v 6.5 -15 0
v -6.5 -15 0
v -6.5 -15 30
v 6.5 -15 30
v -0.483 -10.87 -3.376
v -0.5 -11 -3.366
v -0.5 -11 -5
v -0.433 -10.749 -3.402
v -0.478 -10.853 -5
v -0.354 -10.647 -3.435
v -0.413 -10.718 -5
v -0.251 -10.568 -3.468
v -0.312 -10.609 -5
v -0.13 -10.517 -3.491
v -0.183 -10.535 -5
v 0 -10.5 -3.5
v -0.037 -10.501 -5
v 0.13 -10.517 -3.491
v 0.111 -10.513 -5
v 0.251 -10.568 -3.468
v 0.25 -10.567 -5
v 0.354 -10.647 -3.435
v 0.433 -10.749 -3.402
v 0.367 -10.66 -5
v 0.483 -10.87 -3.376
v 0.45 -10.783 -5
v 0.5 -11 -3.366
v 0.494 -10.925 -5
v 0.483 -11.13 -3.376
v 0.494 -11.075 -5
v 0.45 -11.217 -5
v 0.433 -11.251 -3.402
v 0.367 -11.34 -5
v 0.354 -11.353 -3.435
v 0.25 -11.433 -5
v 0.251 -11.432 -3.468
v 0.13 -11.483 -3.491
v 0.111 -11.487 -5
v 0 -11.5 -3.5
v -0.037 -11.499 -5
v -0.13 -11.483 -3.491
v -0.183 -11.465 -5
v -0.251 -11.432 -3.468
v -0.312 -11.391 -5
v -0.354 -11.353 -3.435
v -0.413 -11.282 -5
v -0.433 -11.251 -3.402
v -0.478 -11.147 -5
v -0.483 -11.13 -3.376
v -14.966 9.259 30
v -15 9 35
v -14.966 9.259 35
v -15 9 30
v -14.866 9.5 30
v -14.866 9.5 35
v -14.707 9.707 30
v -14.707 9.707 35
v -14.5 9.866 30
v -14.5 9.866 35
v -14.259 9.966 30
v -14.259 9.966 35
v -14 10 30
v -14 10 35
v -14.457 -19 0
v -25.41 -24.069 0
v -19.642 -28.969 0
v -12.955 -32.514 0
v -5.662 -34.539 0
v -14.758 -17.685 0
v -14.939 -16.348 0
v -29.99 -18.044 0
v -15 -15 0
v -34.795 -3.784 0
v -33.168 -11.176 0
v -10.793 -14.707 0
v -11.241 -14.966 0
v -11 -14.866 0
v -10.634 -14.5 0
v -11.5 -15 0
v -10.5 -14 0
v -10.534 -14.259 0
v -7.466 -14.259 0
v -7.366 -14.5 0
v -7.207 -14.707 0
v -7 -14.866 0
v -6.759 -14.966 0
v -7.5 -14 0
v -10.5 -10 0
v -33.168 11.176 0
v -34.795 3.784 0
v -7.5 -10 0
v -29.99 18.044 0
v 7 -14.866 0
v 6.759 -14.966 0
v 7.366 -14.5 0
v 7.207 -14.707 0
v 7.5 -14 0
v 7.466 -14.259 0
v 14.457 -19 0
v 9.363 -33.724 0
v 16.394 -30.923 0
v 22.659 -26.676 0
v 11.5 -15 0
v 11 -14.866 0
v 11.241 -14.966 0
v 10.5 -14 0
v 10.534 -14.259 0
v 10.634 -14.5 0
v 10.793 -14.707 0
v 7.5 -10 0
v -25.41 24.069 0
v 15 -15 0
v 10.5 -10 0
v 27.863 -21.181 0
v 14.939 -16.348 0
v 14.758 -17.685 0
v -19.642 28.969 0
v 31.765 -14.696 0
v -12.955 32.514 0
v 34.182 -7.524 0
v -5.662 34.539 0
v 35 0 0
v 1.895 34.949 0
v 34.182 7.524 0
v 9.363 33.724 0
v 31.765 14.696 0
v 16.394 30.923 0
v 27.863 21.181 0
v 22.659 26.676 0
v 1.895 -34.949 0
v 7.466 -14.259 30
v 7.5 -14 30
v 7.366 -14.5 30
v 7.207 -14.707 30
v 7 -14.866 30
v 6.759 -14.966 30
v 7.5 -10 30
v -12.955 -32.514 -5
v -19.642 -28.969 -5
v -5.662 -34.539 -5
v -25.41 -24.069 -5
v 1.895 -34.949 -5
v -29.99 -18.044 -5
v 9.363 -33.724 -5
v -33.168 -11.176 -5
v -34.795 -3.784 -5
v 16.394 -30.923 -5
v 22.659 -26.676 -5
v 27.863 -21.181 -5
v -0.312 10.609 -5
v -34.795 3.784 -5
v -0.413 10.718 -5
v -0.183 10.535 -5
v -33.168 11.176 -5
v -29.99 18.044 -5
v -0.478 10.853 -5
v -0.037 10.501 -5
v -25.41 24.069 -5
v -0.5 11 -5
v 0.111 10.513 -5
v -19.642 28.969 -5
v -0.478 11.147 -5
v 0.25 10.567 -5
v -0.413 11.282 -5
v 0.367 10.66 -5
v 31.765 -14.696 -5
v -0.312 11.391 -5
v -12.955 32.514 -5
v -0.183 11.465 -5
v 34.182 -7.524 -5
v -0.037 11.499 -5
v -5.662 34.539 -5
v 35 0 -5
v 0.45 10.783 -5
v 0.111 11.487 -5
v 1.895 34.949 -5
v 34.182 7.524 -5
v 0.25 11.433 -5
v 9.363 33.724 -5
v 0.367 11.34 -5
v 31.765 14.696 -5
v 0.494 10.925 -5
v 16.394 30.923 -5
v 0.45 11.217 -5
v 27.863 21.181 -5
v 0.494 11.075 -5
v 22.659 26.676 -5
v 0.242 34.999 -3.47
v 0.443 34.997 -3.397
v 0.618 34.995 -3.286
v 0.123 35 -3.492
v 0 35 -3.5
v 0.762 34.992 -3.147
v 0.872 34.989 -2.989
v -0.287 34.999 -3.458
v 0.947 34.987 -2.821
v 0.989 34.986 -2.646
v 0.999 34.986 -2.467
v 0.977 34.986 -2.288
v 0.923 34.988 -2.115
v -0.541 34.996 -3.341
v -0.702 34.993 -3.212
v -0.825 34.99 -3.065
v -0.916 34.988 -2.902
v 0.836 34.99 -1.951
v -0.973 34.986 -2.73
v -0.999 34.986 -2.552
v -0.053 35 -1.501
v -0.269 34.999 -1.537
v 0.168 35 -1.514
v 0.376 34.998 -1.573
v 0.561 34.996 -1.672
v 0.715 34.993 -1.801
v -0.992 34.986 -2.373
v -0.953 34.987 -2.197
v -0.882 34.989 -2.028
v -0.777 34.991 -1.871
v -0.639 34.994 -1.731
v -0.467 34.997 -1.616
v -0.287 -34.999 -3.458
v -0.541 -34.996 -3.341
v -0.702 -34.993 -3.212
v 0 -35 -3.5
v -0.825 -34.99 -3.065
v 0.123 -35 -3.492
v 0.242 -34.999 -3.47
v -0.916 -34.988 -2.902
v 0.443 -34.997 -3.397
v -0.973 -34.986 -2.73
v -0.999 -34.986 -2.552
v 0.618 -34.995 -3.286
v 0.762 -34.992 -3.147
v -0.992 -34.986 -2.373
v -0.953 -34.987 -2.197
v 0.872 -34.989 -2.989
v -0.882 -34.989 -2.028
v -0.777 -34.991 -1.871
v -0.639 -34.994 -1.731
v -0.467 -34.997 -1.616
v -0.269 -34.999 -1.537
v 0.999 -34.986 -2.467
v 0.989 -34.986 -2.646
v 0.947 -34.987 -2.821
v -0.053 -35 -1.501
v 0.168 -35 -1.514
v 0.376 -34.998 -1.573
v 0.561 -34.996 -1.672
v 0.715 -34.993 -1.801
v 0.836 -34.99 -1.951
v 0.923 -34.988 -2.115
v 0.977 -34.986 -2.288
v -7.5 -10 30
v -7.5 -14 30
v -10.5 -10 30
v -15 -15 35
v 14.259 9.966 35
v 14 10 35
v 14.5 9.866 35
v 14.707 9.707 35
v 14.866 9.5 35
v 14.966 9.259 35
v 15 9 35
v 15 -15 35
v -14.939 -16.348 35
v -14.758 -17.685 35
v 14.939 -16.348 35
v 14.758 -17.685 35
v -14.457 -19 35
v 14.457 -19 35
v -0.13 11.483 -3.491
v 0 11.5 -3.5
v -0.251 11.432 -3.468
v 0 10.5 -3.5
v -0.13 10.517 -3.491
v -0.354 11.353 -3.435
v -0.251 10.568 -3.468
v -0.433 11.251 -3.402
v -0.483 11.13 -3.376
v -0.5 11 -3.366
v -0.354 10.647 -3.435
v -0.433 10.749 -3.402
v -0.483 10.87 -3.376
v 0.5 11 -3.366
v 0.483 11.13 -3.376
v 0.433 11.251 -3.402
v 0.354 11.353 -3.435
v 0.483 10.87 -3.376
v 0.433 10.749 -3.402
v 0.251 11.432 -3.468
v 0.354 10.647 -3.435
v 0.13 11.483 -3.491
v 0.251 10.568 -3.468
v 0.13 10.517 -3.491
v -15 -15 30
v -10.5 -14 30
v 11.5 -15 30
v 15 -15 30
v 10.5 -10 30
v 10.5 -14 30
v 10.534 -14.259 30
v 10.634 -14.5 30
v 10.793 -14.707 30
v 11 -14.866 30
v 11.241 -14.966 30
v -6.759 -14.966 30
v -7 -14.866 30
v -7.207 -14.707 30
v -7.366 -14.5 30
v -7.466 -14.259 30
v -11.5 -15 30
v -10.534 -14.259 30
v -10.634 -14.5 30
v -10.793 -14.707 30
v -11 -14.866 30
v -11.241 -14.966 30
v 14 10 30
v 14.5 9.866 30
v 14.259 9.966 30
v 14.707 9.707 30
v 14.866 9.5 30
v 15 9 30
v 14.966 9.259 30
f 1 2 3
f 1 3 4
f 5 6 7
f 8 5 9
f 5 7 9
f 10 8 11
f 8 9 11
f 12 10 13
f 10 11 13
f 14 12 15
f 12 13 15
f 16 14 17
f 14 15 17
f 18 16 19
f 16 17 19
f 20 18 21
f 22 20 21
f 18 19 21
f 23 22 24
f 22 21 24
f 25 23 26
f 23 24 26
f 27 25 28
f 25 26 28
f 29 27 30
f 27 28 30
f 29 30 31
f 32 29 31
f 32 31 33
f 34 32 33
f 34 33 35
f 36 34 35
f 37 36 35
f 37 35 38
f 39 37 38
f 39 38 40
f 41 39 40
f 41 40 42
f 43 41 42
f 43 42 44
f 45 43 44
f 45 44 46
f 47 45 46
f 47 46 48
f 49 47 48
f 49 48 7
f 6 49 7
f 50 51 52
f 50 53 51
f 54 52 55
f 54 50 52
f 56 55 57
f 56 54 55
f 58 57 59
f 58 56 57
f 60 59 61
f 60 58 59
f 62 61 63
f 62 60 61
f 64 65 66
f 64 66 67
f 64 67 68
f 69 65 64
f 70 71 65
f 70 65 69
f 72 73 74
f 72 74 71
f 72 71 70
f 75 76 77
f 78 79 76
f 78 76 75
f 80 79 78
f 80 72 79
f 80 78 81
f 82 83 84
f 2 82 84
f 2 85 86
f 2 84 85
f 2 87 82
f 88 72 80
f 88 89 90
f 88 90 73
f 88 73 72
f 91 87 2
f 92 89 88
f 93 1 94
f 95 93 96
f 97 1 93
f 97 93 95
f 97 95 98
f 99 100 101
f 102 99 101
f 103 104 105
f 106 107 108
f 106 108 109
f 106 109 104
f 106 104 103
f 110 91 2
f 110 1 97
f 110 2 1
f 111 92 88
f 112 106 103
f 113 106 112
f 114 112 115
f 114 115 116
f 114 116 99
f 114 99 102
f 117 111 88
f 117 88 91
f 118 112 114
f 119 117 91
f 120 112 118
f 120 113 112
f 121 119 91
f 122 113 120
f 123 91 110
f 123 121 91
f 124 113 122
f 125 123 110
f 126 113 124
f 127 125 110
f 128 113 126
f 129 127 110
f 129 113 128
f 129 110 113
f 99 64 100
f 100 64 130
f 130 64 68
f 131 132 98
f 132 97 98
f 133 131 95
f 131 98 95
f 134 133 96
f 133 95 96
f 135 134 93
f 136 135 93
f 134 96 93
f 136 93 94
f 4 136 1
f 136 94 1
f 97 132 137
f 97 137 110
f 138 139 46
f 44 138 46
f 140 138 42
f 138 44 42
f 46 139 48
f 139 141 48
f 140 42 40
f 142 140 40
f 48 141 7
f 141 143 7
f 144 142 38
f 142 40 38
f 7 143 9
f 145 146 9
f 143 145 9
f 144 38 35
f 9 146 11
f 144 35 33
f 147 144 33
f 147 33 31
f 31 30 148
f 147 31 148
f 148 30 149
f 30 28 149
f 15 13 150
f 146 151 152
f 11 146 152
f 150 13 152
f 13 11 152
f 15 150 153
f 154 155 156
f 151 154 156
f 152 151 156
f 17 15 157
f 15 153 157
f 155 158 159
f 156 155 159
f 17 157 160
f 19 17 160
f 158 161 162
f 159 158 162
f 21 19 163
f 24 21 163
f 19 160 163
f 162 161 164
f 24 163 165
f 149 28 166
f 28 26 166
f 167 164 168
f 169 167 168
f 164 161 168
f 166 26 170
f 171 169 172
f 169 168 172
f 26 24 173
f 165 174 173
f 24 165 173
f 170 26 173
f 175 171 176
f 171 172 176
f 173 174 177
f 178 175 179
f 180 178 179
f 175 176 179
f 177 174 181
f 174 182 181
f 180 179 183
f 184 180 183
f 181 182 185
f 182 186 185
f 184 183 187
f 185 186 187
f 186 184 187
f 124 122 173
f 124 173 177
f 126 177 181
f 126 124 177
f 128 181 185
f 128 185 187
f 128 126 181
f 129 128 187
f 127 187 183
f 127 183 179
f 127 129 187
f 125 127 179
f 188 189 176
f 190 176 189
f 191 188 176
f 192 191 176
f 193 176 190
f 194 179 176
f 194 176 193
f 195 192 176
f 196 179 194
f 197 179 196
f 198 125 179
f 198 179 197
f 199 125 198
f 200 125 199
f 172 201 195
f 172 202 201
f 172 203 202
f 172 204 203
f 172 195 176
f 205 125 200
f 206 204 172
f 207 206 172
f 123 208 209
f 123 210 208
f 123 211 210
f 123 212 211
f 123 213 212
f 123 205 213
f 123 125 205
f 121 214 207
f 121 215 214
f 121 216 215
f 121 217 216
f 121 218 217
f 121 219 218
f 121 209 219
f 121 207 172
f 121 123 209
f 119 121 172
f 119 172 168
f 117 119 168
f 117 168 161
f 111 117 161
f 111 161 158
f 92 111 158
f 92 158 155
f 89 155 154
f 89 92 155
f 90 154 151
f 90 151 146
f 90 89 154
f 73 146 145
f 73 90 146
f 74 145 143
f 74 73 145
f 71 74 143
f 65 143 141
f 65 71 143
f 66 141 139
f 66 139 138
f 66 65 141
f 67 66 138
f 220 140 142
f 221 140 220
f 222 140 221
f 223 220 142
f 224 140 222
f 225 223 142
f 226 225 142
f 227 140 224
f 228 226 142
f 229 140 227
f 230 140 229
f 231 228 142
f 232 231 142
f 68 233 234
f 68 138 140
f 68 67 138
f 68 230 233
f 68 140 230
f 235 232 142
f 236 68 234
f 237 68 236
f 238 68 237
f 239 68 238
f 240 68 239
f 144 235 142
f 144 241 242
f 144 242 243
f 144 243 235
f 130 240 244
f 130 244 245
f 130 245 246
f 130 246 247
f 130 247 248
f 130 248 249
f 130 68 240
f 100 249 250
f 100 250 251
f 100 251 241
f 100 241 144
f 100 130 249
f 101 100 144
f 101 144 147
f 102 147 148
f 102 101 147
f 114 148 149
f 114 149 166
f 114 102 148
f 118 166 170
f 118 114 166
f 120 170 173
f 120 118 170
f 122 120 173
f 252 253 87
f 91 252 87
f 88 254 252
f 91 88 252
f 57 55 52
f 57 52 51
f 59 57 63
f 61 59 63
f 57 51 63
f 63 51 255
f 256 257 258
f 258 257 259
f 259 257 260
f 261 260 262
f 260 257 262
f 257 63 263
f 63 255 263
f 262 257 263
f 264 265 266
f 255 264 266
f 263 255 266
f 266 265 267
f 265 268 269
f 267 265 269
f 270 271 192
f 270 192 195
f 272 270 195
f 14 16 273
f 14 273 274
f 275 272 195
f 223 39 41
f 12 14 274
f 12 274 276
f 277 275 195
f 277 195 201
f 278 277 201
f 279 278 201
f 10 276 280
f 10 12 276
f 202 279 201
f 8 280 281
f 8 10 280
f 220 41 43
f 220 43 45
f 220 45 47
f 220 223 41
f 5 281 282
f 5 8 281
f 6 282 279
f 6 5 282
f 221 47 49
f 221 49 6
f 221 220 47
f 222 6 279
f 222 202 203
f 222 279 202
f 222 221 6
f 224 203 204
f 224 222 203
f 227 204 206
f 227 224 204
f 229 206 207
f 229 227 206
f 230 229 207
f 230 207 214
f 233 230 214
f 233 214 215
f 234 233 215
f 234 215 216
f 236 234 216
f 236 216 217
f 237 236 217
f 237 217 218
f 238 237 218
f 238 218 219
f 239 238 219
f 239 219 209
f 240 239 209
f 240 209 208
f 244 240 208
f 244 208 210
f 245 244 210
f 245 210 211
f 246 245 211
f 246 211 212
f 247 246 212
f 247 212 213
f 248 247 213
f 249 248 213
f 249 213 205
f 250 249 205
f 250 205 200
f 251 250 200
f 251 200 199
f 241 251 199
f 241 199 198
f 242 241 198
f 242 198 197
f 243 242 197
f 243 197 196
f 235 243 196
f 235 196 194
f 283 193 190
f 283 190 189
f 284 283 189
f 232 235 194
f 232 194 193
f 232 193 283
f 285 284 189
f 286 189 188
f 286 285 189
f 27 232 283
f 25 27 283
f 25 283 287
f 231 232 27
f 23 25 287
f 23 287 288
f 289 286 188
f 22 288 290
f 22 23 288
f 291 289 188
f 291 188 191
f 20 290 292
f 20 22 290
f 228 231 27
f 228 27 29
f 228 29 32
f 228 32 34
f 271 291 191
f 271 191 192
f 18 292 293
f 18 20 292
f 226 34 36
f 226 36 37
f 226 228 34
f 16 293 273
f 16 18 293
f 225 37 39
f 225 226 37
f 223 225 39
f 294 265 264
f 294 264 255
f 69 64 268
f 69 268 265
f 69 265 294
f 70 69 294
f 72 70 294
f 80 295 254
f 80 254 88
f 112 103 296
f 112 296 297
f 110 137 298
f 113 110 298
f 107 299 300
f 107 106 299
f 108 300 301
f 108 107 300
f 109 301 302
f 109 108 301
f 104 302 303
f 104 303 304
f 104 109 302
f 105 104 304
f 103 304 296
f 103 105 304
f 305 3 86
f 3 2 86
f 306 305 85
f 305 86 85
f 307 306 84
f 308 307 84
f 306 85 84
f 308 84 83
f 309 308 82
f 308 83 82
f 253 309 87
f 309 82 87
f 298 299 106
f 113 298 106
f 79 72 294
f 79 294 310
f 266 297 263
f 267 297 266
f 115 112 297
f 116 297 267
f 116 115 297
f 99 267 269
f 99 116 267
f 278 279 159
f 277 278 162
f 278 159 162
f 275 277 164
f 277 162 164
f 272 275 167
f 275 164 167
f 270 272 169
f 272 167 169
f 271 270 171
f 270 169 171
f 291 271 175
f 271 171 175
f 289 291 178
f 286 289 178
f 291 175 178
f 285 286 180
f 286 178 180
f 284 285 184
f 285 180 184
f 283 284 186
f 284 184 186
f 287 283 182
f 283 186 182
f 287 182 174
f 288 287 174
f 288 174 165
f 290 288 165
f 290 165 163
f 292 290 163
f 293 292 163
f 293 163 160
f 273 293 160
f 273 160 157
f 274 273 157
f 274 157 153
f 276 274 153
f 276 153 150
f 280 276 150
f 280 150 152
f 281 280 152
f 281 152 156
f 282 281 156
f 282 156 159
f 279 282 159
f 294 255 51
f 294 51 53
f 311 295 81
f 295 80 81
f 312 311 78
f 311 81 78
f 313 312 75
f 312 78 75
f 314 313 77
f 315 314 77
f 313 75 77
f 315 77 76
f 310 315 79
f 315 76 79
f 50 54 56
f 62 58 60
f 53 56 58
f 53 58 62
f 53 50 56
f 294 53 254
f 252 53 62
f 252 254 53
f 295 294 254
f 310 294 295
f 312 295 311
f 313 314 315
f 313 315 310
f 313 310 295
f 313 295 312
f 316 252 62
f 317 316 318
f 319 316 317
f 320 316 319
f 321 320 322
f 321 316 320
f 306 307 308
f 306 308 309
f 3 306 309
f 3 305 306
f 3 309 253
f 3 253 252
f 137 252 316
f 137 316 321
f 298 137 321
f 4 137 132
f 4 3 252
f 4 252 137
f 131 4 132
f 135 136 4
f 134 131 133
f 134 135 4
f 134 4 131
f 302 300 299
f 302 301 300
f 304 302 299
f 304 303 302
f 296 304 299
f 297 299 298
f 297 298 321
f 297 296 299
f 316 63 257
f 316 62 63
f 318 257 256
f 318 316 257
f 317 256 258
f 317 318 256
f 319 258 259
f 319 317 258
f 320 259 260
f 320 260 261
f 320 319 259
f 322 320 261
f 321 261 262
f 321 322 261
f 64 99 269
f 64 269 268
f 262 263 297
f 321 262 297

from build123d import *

# Parameters (mm, degrees)
SKETCH1_R               = 35
BOSS_EXTRUDE1_DEPTH     = 5
BOSS_EXTRUDE2_DEPTH     = 35
SKETCH3_W               = 30
SKETCH3_H               = 5
BOSS_EXTRUDE3_DEPTH     = 25
SKETCH4_W               = 3
SKETCH4_H               = 30
BOSS_EXTRUDE5_DEPTH     = 5
CUT_EXTRUDE1_DEPTH      = 38
CUT_EXTRUDE1_DEPTH_BACK = 61.621778265
SKETCH5_R               = 1
FILLET1_R               = 1
FILLET2_R               = 1
FILLET3_R               = 1
CUT_EXTRUDE2_REACH      = 65.64
CUT_EXTRUDE2_END_RADIUS = 1
SKETCH6_R               = 0.5


with BuildPart() as part:
    # Sketch1 → Boss-Extrude1 (new body)
    with BuildSketch(Plane.XY):
        Circle(SKETCH1_R)
    extrude(amount=-BOSS_EXTRUDE1_DEPTH)

    # Sketch2 → Boss-Extrude2 (add)
    with BuildSketch(Plane.XY):
        with BuildLine():
            Line((-15, -15), (15, -15))
            ThreePointArc((15, -15), (14.863587797, -17.018355219), (14.456832295, -19))
            Line((14.456832295, -19), (-14.456832295, -19))
            ThreePointArc((-14.456832295, -19), (-14.863587797, -17.018355219), (-15, -15))
        make_face()
    extrude(amount=BOSS_EXTRUDE2_DEPTH)

    # Sketch3 → Boss-Extrude3 (add)
    with BuildSketch(Plane(origin=(0, -15, 0), x_dir=(1, 0, 0), z_dir=(0, 1, 0))):
        with Locations((0, -32.5)):
            Rectangle(SKETCH3_W, SKETCH3_H)
    extrude(amount=BOSS_EXTRUDE3_DEPTH)

    # Sketch4 → Boss-Extrude5 (add)
    with BuildSketch(Plane(origin=(0, -15, 0), x_dir=(1, 0, 0), z_dir=(0, 1, 0))):
        with Locations((9, -15)):
            Rectangle(SKETCH4_W, SKETCH4_H)
        with Locations((-9, -15)):
            Rectangle(SKETCH4_W, SKETCH4_H)
    extrude(amount=BOSS_EXTRUDE5_DEPTH)

    # Sketch5 → Cut-Extrude1 (cut, two sides: drawn at the far end of the back side and taken through both)
    with BuildSketch(Plane(origin=(0, 0, 0), x_dir=(1, 0, 0), z_dir=(0, 1, 0)).offset(-CUT_EXTRUDE1_DEPTH_BACK)):
        with Locations(Location((0, 2.5, 0), (0, 0, 90))):
            Circle(SKETCH5_R)
    extrude(amount=CUT_EXTRUDE1_DEPTH + CUT_EXTRUDE1_DEPTH_BACK, mode=Mode.SUBTRACT)

    # Fillet1
    fillet1_edges = [part.edges().sort_by_distance(p)[0] for p in [
        (15, 10, 32.5),
        (-15, 10, 32.5),
    ]]
    fillet(fillet1_edges, radius=FILLET1_R)

    # Fillet2
    fillet2_edges = [part.edges().sort_by_distance(p)[0] for p in [
        (7.5, -15, 15),
        (-7.5, -15, 15),
    ]]
    fillet(fillet2_edges, radius=FILLET2_R)

    # Fillet3
    fillet3_edges = [part.edges().sort_by_distance(p)[0] for p in [
        (10.5, -15, 15),
        (-10.5, -15, 15),
    ]]
    fillet(fillet3_edges, radius=FILLET3_R)

    # Cut-Extrude2: up to this cylinder (the profile starts outside it)
    cut_extrude2_end = Plane(origin=(0, 0, -2.5), z_dir=(0, -1, 0)) * Cylinder(CUT_EXTRUDE2_END_RADIUS, 156.28, mode=Mode.PRIVATE)
    # Sketch6 → Cut-Extrude2 (cut, up to the surface)
    with BuildSketch(Plane(origin=(0, 0, -5), x_dir=(-1, 0, 0), z_dir=(0, 0, -1)), mode=Mode.PRIVATE) as cut_extrude2_sk1:
        with Locations((0, 11)):
            Circle(SKETCH6_R)
    cut_extrude2_tool1 = extrude(cut_extrude2_sk1.sketch, amount=-CUT_EXTRUDE2_REACH, mode=Mode.PRIVATE) - cut_extrude2_end
    add(cut_extrude2_tool1.solids().sort_by_distance((0, 11, -5))[0], mode=Mode.SUBTRACT)
    # Sketch6 → Cut-Extrude2 (cut, up to the surface)
    with BuildSketch(Plane(origin=(0, 0, -5), x_dir=(-1, 0, 0), z_dir=(0, 0, -1)), mode=Mode.PRIVATE) as cut_extrude2_sk2:
        with Locations((0, -11)):
            Circle(SKETCH6_R)
    cut_extrude2_tool2 = extrude(cut_extrude2_sk2.sketch, amount=-CUT_EXTRUDE2_REACH, mode=Mode.PRIVATE) - cut_extrude2_end
    add(cut_extrude2_tool2.solids().sort_by_distance((0, -11, -5))[0], mode=Mode.SUBTRACT)


solid = part.part
